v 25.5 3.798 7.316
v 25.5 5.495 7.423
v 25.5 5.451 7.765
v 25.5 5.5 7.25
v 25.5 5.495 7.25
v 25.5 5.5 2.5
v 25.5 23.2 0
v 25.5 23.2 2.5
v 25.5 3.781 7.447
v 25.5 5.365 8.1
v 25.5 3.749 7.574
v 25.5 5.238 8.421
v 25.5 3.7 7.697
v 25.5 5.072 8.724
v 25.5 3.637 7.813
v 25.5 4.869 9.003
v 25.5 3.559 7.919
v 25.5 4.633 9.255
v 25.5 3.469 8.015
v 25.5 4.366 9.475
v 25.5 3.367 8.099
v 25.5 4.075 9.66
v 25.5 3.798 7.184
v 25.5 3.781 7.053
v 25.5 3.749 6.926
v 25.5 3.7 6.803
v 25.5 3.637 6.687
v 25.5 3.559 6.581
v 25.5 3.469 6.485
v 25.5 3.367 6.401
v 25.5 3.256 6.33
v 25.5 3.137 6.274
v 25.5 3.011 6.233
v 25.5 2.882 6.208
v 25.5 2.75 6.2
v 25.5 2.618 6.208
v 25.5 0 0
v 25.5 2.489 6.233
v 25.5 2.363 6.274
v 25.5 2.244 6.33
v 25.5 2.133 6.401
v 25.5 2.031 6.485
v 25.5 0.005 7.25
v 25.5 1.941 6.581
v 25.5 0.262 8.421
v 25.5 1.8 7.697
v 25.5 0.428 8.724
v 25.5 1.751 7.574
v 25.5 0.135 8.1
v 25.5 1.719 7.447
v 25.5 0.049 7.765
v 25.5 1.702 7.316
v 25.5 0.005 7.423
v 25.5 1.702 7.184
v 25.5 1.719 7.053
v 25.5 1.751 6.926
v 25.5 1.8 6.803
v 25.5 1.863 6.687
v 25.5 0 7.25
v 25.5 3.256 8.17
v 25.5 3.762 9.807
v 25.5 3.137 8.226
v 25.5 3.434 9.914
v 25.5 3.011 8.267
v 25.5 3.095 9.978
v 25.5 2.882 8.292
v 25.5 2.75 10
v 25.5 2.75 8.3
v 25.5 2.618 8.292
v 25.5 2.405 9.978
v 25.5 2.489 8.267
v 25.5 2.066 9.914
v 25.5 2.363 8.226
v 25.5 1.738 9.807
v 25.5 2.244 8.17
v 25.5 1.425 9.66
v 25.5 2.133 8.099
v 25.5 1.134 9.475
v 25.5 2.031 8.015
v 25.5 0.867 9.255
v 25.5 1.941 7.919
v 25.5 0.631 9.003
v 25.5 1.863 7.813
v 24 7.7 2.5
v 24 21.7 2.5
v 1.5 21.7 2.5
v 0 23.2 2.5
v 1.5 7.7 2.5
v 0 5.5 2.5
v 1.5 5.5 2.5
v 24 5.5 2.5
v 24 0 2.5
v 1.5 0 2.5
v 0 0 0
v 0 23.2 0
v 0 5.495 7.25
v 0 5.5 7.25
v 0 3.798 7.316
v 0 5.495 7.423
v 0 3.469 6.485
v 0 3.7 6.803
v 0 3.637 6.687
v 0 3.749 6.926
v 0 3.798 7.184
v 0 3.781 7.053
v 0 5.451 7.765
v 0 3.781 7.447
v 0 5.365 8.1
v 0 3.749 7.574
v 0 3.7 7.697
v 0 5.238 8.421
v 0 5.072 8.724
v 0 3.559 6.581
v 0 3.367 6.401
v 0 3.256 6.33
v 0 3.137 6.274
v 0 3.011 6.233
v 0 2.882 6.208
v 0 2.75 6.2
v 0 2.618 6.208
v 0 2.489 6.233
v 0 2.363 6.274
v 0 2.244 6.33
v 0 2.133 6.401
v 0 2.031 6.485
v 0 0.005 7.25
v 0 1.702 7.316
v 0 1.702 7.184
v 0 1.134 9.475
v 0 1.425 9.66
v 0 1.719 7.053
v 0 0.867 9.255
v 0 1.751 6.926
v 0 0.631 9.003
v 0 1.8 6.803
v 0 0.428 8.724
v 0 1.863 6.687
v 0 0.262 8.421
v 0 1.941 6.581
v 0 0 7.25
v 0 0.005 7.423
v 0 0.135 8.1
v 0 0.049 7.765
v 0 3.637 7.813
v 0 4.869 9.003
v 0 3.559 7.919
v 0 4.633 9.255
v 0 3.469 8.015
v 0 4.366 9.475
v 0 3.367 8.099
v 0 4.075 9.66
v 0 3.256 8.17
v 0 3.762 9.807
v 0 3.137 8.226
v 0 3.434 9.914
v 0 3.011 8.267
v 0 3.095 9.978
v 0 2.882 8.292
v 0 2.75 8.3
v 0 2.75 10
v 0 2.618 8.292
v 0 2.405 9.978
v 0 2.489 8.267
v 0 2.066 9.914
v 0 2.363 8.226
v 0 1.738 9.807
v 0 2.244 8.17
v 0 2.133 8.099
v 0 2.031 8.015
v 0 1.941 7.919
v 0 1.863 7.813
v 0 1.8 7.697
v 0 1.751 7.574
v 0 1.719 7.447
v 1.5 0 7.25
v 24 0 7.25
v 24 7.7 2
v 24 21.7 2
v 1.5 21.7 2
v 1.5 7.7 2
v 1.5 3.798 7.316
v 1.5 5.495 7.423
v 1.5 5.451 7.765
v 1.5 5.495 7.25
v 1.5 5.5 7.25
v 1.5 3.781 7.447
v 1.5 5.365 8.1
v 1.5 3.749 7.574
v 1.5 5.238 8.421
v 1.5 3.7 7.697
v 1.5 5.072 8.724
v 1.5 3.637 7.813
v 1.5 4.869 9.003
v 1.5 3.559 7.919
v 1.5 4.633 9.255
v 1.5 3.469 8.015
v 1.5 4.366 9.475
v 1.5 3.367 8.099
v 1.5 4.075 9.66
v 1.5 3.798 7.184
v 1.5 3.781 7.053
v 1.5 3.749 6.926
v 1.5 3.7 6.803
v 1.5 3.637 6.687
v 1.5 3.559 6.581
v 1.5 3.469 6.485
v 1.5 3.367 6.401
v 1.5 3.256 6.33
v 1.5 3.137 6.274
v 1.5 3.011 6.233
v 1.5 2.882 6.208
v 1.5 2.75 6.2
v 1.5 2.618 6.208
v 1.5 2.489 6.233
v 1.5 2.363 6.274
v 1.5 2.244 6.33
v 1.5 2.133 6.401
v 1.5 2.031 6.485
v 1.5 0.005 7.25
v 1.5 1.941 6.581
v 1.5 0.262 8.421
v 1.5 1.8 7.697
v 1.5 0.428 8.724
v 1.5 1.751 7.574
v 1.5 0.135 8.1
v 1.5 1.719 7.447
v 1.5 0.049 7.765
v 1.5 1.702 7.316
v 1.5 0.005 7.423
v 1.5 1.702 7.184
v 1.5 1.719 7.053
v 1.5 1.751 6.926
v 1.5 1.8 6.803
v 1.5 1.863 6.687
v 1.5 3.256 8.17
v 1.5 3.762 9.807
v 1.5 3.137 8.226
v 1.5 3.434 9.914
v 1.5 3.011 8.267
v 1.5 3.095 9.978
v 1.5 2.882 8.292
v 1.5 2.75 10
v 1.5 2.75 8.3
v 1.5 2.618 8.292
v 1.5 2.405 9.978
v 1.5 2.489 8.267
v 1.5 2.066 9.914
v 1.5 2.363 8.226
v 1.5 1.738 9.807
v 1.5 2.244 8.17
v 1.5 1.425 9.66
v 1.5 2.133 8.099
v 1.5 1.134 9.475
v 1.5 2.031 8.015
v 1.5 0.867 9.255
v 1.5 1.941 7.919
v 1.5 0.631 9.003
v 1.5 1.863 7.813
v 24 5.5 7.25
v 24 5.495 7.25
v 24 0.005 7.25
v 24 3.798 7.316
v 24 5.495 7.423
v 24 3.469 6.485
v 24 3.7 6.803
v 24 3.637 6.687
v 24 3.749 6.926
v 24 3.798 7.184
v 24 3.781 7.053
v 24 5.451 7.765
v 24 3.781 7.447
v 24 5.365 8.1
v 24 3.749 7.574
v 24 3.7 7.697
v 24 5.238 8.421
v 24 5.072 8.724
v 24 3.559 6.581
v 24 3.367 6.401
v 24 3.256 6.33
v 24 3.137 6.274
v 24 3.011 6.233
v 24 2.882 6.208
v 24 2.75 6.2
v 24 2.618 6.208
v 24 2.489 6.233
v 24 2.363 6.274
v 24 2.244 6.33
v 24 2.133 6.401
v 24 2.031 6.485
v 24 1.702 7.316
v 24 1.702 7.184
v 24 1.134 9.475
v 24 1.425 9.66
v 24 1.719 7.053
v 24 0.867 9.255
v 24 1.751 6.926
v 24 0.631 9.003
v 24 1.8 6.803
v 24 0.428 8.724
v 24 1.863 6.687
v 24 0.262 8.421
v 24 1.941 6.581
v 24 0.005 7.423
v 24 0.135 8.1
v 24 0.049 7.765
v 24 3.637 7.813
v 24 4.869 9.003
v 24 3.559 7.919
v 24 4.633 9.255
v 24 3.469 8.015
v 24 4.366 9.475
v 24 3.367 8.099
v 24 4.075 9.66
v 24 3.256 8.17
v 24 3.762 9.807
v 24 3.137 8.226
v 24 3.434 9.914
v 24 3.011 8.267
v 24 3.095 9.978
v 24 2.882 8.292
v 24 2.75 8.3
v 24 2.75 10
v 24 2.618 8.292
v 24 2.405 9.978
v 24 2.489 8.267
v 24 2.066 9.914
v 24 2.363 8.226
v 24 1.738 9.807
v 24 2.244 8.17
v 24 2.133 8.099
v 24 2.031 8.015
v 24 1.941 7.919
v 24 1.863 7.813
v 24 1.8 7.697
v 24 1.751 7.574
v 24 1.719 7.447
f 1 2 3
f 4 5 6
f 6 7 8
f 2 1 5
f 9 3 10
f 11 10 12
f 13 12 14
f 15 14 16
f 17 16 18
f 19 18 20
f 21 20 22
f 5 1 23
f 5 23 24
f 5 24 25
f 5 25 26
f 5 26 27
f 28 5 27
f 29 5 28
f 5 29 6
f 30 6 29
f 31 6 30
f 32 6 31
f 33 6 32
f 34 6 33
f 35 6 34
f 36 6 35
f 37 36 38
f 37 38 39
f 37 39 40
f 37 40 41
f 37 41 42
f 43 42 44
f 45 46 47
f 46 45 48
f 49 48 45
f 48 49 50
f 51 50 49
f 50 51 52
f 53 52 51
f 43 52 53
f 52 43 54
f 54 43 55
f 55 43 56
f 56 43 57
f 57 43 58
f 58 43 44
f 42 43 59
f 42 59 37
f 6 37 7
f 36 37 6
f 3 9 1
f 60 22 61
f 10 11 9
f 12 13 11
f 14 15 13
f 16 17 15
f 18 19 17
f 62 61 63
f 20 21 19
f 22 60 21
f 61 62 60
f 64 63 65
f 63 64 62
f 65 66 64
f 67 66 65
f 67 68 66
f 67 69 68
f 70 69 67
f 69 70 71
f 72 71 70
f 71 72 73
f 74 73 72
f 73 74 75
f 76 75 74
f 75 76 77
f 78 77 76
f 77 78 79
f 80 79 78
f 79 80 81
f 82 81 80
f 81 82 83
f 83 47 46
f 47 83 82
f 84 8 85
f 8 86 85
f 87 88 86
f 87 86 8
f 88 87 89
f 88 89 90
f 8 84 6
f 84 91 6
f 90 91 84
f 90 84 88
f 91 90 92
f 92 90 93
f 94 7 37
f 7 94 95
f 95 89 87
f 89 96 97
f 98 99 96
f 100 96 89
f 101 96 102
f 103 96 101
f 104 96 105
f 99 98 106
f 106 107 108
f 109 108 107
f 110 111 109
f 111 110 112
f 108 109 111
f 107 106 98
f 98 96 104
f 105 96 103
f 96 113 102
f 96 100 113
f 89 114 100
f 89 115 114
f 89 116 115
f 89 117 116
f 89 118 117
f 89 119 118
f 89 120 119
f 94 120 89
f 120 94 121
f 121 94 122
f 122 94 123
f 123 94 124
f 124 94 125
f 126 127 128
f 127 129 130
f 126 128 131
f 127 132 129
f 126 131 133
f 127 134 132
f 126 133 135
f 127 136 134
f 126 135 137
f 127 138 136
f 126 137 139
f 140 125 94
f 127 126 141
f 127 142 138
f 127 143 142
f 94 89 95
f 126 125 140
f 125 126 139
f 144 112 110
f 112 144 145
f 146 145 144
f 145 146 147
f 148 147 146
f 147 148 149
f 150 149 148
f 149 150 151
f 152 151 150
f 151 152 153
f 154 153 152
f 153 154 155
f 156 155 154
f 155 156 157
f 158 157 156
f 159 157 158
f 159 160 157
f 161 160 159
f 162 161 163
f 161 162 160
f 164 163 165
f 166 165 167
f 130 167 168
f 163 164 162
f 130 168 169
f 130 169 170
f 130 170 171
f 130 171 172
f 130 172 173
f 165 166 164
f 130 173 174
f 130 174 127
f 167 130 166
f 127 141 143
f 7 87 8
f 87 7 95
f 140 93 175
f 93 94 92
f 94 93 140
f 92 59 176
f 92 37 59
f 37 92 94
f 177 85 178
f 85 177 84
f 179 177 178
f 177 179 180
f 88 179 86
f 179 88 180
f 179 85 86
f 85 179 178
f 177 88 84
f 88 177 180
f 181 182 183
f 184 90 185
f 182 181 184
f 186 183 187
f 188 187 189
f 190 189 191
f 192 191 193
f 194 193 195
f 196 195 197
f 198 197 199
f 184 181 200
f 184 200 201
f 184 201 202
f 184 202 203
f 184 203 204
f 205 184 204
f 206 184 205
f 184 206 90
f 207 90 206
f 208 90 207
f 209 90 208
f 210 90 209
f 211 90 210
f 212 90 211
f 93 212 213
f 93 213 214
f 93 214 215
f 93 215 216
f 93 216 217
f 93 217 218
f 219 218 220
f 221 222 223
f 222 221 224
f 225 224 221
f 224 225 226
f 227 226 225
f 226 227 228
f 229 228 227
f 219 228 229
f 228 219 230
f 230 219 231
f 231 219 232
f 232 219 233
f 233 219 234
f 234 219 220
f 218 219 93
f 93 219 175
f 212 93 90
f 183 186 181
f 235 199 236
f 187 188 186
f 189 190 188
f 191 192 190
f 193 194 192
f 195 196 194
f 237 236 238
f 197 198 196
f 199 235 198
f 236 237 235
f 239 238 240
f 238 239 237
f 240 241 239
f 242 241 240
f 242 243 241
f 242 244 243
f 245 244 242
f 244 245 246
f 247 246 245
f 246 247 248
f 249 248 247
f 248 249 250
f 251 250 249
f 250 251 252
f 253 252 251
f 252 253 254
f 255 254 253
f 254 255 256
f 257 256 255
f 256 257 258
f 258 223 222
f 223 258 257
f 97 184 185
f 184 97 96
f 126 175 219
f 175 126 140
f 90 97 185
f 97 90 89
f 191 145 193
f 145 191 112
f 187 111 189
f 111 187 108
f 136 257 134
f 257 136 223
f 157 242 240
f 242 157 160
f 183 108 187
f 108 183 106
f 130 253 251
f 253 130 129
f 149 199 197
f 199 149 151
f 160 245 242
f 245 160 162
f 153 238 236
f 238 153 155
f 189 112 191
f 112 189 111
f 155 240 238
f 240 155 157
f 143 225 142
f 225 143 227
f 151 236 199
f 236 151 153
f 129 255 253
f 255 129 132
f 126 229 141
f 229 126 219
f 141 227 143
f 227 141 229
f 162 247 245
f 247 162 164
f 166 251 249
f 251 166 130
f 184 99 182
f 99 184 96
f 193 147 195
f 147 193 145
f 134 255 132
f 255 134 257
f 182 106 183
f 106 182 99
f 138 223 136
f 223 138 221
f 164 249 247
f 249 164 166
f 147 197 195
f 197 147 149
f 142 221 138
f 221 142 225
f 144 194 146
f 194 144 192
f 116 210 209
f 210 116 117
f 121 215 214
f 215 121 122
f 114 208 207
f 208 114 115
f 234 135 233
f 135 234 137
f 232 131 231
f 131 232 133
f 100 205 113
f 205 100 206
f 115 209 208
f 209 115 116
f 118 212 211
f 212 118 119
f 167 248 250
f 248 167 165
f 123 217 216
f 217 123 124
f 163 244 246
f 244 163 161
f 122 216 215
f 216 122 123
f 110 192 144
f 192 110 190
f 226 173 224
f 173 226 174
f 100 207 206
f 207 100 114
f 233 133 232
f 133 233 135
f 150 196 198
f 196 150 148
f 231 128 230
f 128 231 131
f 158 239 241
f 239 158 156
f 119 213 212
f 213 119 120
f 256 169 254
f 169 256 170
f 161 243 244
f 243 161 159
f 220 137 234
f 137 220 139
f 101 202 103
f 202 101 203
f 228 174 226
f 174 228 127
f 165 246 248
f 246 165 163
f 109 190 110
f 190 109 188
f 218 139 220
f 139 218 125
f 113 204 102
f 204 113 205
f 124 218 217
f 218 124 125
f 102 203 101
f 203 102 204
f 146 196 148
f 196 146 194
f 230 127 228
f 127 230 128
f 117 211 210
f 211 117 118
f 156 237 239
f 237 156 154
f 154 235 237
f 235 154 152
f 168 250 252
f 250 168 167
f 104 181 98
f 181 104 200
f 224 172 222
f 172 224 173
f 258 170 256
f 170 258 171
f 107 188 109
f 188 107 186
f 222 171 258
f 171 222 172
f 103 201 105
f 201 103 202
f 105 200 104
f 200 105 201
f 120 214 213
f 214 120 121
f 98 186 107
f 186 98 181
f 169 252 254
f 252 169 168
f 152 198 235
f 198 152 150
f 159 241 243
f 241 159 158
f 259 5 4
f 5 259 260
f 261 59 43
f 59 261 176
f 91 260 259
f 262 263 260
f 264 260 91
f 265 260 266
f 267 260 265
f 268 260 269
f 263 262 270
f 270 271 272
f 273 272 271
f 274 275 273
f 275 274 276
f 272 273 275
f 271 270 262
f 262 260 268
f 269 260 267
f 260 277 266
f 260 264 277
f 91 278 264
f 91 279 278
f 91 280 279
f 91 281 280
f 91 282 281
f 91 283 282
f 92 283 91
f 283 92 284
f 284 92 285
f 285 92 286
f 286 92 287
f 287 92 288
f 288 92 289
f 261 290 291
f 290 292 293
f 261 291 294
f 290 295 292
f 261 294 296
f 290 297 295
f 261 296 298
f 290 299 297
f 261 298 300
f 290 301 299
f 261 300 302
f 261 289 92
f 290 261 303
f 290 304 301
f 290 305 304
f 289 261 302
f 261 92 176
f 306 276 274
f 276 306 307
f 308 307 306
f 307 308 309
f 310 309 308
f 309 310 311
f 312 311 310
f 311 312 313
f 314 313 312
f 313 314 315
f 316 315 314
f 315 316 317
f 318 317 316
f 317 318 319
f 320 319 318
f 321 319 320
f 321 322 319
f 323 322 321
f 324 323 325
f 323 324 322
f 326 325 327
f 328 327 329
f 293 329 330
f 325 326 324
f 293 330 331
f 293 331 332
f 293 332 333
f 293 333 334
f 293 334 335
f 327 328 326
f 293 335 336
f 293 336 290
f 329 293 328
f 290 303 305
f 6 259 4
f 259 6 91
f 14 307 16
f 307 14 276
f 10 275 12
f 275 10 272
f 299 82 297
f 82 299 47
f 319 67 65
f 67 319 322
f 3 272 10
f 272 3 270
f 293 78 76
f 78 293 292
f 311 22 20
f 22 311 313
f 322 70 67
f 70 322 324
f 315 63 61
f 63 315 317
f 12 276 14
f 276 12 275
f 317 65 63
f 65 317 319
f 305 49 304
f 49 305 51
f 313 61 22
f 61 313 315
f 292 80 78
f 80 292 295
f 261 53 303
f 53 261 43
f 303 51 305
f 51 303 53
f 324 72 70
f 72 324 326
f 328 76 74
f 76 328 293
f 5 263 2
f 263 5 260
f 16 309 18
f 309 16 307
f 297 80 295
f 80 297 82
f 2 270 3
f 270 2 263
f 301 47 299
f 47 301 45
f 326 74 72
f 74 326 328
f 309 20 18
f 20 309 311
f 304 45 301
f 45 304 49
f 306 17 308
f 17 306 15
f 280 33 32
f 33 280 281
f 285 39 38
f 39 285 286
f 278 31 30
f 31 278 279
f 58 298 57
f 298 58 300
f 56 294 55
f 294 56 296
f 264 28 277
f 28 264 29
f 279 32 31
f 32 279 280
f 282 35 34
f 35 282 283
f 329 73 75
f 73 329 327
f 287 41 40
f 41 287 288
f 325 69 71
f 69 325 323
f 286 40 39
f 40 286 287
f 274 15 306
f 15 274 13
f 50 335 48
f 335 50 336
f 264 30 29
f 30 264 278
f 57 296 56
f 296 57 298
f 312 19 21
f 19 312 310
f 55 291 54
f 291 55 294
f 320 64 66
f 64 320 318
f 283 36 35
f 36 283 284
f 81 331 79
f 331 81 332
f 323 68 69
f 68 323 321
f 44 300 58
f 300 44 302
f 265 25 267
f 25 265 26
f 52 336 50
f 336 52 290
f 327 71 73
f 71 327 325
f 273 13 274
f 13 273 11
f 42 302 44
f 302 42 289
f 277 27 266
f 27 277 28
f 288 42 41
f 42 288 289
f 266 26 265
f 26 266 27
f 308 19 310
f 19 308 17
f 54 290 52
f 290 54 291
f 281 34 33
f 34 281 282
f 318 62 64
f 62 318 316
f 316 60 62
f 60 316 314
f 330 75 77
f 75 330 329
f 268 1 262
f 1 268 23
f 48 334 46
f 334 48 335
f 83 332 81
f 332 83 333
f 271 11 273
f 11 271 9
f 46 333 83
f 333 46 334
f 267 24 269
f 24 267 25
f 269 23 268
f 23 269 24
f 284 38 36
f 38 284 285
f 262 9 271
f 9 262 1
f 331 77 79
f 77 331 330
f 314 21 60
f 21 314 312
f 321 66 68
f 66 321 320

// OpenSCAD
// Resolution
$fn =50;

// Base parameters

width      = 25.5;
length     = 23.2;
thick      =  2.5;

// emboss parameters
embWidth   = 22.5;
embLength  = 14;
embThick   =  0.5;

embOffsetX = ( width  -embWidth  ) / 2;
embOffsetY = ( length -embLength )- embOffsetX;

// wing parameters
wingHeight = 10;
wingWidth  =  5.5;
wingThick  =  1.5;
wingHole   =  2.1;


//Base
difference (){
	// base
	cube ( [ width, length, thick ] );

	// emboss
	translate ( [ embOffsetX, embOffsetY, thick - embThick] )
		cube ( [ embWidth, embLength, embThick + 0.1 ] ) ;
}

// first wing
wing();

// second wing
translate ( [ width - wingThick, 0, 0 ] )
	wing();

module wing(){
	difference (){
		//leg
		union(){
			cube ( [ wingThick, wingWidth, wingHeight - wingWidth / 2 ] );
			translate ( [ 0, wingWidth / 2, wingHeight - wingWidth / 2 ] )
				rotate ( [ 0, 90, 0 ] )
					cylinder( wingThick, wingWidth / 2, wingWidth / 2 );
		}   
		// hole                 
		translate ( [-0.1 , wingWidth / 2, wingHeight - wingWidth / 2 ])
			rotate ( [ 0, 90, 0 ] )
				cylinder( wingThick + 0.2, wingHole / 2, wingHole / 2 );
	}
}
